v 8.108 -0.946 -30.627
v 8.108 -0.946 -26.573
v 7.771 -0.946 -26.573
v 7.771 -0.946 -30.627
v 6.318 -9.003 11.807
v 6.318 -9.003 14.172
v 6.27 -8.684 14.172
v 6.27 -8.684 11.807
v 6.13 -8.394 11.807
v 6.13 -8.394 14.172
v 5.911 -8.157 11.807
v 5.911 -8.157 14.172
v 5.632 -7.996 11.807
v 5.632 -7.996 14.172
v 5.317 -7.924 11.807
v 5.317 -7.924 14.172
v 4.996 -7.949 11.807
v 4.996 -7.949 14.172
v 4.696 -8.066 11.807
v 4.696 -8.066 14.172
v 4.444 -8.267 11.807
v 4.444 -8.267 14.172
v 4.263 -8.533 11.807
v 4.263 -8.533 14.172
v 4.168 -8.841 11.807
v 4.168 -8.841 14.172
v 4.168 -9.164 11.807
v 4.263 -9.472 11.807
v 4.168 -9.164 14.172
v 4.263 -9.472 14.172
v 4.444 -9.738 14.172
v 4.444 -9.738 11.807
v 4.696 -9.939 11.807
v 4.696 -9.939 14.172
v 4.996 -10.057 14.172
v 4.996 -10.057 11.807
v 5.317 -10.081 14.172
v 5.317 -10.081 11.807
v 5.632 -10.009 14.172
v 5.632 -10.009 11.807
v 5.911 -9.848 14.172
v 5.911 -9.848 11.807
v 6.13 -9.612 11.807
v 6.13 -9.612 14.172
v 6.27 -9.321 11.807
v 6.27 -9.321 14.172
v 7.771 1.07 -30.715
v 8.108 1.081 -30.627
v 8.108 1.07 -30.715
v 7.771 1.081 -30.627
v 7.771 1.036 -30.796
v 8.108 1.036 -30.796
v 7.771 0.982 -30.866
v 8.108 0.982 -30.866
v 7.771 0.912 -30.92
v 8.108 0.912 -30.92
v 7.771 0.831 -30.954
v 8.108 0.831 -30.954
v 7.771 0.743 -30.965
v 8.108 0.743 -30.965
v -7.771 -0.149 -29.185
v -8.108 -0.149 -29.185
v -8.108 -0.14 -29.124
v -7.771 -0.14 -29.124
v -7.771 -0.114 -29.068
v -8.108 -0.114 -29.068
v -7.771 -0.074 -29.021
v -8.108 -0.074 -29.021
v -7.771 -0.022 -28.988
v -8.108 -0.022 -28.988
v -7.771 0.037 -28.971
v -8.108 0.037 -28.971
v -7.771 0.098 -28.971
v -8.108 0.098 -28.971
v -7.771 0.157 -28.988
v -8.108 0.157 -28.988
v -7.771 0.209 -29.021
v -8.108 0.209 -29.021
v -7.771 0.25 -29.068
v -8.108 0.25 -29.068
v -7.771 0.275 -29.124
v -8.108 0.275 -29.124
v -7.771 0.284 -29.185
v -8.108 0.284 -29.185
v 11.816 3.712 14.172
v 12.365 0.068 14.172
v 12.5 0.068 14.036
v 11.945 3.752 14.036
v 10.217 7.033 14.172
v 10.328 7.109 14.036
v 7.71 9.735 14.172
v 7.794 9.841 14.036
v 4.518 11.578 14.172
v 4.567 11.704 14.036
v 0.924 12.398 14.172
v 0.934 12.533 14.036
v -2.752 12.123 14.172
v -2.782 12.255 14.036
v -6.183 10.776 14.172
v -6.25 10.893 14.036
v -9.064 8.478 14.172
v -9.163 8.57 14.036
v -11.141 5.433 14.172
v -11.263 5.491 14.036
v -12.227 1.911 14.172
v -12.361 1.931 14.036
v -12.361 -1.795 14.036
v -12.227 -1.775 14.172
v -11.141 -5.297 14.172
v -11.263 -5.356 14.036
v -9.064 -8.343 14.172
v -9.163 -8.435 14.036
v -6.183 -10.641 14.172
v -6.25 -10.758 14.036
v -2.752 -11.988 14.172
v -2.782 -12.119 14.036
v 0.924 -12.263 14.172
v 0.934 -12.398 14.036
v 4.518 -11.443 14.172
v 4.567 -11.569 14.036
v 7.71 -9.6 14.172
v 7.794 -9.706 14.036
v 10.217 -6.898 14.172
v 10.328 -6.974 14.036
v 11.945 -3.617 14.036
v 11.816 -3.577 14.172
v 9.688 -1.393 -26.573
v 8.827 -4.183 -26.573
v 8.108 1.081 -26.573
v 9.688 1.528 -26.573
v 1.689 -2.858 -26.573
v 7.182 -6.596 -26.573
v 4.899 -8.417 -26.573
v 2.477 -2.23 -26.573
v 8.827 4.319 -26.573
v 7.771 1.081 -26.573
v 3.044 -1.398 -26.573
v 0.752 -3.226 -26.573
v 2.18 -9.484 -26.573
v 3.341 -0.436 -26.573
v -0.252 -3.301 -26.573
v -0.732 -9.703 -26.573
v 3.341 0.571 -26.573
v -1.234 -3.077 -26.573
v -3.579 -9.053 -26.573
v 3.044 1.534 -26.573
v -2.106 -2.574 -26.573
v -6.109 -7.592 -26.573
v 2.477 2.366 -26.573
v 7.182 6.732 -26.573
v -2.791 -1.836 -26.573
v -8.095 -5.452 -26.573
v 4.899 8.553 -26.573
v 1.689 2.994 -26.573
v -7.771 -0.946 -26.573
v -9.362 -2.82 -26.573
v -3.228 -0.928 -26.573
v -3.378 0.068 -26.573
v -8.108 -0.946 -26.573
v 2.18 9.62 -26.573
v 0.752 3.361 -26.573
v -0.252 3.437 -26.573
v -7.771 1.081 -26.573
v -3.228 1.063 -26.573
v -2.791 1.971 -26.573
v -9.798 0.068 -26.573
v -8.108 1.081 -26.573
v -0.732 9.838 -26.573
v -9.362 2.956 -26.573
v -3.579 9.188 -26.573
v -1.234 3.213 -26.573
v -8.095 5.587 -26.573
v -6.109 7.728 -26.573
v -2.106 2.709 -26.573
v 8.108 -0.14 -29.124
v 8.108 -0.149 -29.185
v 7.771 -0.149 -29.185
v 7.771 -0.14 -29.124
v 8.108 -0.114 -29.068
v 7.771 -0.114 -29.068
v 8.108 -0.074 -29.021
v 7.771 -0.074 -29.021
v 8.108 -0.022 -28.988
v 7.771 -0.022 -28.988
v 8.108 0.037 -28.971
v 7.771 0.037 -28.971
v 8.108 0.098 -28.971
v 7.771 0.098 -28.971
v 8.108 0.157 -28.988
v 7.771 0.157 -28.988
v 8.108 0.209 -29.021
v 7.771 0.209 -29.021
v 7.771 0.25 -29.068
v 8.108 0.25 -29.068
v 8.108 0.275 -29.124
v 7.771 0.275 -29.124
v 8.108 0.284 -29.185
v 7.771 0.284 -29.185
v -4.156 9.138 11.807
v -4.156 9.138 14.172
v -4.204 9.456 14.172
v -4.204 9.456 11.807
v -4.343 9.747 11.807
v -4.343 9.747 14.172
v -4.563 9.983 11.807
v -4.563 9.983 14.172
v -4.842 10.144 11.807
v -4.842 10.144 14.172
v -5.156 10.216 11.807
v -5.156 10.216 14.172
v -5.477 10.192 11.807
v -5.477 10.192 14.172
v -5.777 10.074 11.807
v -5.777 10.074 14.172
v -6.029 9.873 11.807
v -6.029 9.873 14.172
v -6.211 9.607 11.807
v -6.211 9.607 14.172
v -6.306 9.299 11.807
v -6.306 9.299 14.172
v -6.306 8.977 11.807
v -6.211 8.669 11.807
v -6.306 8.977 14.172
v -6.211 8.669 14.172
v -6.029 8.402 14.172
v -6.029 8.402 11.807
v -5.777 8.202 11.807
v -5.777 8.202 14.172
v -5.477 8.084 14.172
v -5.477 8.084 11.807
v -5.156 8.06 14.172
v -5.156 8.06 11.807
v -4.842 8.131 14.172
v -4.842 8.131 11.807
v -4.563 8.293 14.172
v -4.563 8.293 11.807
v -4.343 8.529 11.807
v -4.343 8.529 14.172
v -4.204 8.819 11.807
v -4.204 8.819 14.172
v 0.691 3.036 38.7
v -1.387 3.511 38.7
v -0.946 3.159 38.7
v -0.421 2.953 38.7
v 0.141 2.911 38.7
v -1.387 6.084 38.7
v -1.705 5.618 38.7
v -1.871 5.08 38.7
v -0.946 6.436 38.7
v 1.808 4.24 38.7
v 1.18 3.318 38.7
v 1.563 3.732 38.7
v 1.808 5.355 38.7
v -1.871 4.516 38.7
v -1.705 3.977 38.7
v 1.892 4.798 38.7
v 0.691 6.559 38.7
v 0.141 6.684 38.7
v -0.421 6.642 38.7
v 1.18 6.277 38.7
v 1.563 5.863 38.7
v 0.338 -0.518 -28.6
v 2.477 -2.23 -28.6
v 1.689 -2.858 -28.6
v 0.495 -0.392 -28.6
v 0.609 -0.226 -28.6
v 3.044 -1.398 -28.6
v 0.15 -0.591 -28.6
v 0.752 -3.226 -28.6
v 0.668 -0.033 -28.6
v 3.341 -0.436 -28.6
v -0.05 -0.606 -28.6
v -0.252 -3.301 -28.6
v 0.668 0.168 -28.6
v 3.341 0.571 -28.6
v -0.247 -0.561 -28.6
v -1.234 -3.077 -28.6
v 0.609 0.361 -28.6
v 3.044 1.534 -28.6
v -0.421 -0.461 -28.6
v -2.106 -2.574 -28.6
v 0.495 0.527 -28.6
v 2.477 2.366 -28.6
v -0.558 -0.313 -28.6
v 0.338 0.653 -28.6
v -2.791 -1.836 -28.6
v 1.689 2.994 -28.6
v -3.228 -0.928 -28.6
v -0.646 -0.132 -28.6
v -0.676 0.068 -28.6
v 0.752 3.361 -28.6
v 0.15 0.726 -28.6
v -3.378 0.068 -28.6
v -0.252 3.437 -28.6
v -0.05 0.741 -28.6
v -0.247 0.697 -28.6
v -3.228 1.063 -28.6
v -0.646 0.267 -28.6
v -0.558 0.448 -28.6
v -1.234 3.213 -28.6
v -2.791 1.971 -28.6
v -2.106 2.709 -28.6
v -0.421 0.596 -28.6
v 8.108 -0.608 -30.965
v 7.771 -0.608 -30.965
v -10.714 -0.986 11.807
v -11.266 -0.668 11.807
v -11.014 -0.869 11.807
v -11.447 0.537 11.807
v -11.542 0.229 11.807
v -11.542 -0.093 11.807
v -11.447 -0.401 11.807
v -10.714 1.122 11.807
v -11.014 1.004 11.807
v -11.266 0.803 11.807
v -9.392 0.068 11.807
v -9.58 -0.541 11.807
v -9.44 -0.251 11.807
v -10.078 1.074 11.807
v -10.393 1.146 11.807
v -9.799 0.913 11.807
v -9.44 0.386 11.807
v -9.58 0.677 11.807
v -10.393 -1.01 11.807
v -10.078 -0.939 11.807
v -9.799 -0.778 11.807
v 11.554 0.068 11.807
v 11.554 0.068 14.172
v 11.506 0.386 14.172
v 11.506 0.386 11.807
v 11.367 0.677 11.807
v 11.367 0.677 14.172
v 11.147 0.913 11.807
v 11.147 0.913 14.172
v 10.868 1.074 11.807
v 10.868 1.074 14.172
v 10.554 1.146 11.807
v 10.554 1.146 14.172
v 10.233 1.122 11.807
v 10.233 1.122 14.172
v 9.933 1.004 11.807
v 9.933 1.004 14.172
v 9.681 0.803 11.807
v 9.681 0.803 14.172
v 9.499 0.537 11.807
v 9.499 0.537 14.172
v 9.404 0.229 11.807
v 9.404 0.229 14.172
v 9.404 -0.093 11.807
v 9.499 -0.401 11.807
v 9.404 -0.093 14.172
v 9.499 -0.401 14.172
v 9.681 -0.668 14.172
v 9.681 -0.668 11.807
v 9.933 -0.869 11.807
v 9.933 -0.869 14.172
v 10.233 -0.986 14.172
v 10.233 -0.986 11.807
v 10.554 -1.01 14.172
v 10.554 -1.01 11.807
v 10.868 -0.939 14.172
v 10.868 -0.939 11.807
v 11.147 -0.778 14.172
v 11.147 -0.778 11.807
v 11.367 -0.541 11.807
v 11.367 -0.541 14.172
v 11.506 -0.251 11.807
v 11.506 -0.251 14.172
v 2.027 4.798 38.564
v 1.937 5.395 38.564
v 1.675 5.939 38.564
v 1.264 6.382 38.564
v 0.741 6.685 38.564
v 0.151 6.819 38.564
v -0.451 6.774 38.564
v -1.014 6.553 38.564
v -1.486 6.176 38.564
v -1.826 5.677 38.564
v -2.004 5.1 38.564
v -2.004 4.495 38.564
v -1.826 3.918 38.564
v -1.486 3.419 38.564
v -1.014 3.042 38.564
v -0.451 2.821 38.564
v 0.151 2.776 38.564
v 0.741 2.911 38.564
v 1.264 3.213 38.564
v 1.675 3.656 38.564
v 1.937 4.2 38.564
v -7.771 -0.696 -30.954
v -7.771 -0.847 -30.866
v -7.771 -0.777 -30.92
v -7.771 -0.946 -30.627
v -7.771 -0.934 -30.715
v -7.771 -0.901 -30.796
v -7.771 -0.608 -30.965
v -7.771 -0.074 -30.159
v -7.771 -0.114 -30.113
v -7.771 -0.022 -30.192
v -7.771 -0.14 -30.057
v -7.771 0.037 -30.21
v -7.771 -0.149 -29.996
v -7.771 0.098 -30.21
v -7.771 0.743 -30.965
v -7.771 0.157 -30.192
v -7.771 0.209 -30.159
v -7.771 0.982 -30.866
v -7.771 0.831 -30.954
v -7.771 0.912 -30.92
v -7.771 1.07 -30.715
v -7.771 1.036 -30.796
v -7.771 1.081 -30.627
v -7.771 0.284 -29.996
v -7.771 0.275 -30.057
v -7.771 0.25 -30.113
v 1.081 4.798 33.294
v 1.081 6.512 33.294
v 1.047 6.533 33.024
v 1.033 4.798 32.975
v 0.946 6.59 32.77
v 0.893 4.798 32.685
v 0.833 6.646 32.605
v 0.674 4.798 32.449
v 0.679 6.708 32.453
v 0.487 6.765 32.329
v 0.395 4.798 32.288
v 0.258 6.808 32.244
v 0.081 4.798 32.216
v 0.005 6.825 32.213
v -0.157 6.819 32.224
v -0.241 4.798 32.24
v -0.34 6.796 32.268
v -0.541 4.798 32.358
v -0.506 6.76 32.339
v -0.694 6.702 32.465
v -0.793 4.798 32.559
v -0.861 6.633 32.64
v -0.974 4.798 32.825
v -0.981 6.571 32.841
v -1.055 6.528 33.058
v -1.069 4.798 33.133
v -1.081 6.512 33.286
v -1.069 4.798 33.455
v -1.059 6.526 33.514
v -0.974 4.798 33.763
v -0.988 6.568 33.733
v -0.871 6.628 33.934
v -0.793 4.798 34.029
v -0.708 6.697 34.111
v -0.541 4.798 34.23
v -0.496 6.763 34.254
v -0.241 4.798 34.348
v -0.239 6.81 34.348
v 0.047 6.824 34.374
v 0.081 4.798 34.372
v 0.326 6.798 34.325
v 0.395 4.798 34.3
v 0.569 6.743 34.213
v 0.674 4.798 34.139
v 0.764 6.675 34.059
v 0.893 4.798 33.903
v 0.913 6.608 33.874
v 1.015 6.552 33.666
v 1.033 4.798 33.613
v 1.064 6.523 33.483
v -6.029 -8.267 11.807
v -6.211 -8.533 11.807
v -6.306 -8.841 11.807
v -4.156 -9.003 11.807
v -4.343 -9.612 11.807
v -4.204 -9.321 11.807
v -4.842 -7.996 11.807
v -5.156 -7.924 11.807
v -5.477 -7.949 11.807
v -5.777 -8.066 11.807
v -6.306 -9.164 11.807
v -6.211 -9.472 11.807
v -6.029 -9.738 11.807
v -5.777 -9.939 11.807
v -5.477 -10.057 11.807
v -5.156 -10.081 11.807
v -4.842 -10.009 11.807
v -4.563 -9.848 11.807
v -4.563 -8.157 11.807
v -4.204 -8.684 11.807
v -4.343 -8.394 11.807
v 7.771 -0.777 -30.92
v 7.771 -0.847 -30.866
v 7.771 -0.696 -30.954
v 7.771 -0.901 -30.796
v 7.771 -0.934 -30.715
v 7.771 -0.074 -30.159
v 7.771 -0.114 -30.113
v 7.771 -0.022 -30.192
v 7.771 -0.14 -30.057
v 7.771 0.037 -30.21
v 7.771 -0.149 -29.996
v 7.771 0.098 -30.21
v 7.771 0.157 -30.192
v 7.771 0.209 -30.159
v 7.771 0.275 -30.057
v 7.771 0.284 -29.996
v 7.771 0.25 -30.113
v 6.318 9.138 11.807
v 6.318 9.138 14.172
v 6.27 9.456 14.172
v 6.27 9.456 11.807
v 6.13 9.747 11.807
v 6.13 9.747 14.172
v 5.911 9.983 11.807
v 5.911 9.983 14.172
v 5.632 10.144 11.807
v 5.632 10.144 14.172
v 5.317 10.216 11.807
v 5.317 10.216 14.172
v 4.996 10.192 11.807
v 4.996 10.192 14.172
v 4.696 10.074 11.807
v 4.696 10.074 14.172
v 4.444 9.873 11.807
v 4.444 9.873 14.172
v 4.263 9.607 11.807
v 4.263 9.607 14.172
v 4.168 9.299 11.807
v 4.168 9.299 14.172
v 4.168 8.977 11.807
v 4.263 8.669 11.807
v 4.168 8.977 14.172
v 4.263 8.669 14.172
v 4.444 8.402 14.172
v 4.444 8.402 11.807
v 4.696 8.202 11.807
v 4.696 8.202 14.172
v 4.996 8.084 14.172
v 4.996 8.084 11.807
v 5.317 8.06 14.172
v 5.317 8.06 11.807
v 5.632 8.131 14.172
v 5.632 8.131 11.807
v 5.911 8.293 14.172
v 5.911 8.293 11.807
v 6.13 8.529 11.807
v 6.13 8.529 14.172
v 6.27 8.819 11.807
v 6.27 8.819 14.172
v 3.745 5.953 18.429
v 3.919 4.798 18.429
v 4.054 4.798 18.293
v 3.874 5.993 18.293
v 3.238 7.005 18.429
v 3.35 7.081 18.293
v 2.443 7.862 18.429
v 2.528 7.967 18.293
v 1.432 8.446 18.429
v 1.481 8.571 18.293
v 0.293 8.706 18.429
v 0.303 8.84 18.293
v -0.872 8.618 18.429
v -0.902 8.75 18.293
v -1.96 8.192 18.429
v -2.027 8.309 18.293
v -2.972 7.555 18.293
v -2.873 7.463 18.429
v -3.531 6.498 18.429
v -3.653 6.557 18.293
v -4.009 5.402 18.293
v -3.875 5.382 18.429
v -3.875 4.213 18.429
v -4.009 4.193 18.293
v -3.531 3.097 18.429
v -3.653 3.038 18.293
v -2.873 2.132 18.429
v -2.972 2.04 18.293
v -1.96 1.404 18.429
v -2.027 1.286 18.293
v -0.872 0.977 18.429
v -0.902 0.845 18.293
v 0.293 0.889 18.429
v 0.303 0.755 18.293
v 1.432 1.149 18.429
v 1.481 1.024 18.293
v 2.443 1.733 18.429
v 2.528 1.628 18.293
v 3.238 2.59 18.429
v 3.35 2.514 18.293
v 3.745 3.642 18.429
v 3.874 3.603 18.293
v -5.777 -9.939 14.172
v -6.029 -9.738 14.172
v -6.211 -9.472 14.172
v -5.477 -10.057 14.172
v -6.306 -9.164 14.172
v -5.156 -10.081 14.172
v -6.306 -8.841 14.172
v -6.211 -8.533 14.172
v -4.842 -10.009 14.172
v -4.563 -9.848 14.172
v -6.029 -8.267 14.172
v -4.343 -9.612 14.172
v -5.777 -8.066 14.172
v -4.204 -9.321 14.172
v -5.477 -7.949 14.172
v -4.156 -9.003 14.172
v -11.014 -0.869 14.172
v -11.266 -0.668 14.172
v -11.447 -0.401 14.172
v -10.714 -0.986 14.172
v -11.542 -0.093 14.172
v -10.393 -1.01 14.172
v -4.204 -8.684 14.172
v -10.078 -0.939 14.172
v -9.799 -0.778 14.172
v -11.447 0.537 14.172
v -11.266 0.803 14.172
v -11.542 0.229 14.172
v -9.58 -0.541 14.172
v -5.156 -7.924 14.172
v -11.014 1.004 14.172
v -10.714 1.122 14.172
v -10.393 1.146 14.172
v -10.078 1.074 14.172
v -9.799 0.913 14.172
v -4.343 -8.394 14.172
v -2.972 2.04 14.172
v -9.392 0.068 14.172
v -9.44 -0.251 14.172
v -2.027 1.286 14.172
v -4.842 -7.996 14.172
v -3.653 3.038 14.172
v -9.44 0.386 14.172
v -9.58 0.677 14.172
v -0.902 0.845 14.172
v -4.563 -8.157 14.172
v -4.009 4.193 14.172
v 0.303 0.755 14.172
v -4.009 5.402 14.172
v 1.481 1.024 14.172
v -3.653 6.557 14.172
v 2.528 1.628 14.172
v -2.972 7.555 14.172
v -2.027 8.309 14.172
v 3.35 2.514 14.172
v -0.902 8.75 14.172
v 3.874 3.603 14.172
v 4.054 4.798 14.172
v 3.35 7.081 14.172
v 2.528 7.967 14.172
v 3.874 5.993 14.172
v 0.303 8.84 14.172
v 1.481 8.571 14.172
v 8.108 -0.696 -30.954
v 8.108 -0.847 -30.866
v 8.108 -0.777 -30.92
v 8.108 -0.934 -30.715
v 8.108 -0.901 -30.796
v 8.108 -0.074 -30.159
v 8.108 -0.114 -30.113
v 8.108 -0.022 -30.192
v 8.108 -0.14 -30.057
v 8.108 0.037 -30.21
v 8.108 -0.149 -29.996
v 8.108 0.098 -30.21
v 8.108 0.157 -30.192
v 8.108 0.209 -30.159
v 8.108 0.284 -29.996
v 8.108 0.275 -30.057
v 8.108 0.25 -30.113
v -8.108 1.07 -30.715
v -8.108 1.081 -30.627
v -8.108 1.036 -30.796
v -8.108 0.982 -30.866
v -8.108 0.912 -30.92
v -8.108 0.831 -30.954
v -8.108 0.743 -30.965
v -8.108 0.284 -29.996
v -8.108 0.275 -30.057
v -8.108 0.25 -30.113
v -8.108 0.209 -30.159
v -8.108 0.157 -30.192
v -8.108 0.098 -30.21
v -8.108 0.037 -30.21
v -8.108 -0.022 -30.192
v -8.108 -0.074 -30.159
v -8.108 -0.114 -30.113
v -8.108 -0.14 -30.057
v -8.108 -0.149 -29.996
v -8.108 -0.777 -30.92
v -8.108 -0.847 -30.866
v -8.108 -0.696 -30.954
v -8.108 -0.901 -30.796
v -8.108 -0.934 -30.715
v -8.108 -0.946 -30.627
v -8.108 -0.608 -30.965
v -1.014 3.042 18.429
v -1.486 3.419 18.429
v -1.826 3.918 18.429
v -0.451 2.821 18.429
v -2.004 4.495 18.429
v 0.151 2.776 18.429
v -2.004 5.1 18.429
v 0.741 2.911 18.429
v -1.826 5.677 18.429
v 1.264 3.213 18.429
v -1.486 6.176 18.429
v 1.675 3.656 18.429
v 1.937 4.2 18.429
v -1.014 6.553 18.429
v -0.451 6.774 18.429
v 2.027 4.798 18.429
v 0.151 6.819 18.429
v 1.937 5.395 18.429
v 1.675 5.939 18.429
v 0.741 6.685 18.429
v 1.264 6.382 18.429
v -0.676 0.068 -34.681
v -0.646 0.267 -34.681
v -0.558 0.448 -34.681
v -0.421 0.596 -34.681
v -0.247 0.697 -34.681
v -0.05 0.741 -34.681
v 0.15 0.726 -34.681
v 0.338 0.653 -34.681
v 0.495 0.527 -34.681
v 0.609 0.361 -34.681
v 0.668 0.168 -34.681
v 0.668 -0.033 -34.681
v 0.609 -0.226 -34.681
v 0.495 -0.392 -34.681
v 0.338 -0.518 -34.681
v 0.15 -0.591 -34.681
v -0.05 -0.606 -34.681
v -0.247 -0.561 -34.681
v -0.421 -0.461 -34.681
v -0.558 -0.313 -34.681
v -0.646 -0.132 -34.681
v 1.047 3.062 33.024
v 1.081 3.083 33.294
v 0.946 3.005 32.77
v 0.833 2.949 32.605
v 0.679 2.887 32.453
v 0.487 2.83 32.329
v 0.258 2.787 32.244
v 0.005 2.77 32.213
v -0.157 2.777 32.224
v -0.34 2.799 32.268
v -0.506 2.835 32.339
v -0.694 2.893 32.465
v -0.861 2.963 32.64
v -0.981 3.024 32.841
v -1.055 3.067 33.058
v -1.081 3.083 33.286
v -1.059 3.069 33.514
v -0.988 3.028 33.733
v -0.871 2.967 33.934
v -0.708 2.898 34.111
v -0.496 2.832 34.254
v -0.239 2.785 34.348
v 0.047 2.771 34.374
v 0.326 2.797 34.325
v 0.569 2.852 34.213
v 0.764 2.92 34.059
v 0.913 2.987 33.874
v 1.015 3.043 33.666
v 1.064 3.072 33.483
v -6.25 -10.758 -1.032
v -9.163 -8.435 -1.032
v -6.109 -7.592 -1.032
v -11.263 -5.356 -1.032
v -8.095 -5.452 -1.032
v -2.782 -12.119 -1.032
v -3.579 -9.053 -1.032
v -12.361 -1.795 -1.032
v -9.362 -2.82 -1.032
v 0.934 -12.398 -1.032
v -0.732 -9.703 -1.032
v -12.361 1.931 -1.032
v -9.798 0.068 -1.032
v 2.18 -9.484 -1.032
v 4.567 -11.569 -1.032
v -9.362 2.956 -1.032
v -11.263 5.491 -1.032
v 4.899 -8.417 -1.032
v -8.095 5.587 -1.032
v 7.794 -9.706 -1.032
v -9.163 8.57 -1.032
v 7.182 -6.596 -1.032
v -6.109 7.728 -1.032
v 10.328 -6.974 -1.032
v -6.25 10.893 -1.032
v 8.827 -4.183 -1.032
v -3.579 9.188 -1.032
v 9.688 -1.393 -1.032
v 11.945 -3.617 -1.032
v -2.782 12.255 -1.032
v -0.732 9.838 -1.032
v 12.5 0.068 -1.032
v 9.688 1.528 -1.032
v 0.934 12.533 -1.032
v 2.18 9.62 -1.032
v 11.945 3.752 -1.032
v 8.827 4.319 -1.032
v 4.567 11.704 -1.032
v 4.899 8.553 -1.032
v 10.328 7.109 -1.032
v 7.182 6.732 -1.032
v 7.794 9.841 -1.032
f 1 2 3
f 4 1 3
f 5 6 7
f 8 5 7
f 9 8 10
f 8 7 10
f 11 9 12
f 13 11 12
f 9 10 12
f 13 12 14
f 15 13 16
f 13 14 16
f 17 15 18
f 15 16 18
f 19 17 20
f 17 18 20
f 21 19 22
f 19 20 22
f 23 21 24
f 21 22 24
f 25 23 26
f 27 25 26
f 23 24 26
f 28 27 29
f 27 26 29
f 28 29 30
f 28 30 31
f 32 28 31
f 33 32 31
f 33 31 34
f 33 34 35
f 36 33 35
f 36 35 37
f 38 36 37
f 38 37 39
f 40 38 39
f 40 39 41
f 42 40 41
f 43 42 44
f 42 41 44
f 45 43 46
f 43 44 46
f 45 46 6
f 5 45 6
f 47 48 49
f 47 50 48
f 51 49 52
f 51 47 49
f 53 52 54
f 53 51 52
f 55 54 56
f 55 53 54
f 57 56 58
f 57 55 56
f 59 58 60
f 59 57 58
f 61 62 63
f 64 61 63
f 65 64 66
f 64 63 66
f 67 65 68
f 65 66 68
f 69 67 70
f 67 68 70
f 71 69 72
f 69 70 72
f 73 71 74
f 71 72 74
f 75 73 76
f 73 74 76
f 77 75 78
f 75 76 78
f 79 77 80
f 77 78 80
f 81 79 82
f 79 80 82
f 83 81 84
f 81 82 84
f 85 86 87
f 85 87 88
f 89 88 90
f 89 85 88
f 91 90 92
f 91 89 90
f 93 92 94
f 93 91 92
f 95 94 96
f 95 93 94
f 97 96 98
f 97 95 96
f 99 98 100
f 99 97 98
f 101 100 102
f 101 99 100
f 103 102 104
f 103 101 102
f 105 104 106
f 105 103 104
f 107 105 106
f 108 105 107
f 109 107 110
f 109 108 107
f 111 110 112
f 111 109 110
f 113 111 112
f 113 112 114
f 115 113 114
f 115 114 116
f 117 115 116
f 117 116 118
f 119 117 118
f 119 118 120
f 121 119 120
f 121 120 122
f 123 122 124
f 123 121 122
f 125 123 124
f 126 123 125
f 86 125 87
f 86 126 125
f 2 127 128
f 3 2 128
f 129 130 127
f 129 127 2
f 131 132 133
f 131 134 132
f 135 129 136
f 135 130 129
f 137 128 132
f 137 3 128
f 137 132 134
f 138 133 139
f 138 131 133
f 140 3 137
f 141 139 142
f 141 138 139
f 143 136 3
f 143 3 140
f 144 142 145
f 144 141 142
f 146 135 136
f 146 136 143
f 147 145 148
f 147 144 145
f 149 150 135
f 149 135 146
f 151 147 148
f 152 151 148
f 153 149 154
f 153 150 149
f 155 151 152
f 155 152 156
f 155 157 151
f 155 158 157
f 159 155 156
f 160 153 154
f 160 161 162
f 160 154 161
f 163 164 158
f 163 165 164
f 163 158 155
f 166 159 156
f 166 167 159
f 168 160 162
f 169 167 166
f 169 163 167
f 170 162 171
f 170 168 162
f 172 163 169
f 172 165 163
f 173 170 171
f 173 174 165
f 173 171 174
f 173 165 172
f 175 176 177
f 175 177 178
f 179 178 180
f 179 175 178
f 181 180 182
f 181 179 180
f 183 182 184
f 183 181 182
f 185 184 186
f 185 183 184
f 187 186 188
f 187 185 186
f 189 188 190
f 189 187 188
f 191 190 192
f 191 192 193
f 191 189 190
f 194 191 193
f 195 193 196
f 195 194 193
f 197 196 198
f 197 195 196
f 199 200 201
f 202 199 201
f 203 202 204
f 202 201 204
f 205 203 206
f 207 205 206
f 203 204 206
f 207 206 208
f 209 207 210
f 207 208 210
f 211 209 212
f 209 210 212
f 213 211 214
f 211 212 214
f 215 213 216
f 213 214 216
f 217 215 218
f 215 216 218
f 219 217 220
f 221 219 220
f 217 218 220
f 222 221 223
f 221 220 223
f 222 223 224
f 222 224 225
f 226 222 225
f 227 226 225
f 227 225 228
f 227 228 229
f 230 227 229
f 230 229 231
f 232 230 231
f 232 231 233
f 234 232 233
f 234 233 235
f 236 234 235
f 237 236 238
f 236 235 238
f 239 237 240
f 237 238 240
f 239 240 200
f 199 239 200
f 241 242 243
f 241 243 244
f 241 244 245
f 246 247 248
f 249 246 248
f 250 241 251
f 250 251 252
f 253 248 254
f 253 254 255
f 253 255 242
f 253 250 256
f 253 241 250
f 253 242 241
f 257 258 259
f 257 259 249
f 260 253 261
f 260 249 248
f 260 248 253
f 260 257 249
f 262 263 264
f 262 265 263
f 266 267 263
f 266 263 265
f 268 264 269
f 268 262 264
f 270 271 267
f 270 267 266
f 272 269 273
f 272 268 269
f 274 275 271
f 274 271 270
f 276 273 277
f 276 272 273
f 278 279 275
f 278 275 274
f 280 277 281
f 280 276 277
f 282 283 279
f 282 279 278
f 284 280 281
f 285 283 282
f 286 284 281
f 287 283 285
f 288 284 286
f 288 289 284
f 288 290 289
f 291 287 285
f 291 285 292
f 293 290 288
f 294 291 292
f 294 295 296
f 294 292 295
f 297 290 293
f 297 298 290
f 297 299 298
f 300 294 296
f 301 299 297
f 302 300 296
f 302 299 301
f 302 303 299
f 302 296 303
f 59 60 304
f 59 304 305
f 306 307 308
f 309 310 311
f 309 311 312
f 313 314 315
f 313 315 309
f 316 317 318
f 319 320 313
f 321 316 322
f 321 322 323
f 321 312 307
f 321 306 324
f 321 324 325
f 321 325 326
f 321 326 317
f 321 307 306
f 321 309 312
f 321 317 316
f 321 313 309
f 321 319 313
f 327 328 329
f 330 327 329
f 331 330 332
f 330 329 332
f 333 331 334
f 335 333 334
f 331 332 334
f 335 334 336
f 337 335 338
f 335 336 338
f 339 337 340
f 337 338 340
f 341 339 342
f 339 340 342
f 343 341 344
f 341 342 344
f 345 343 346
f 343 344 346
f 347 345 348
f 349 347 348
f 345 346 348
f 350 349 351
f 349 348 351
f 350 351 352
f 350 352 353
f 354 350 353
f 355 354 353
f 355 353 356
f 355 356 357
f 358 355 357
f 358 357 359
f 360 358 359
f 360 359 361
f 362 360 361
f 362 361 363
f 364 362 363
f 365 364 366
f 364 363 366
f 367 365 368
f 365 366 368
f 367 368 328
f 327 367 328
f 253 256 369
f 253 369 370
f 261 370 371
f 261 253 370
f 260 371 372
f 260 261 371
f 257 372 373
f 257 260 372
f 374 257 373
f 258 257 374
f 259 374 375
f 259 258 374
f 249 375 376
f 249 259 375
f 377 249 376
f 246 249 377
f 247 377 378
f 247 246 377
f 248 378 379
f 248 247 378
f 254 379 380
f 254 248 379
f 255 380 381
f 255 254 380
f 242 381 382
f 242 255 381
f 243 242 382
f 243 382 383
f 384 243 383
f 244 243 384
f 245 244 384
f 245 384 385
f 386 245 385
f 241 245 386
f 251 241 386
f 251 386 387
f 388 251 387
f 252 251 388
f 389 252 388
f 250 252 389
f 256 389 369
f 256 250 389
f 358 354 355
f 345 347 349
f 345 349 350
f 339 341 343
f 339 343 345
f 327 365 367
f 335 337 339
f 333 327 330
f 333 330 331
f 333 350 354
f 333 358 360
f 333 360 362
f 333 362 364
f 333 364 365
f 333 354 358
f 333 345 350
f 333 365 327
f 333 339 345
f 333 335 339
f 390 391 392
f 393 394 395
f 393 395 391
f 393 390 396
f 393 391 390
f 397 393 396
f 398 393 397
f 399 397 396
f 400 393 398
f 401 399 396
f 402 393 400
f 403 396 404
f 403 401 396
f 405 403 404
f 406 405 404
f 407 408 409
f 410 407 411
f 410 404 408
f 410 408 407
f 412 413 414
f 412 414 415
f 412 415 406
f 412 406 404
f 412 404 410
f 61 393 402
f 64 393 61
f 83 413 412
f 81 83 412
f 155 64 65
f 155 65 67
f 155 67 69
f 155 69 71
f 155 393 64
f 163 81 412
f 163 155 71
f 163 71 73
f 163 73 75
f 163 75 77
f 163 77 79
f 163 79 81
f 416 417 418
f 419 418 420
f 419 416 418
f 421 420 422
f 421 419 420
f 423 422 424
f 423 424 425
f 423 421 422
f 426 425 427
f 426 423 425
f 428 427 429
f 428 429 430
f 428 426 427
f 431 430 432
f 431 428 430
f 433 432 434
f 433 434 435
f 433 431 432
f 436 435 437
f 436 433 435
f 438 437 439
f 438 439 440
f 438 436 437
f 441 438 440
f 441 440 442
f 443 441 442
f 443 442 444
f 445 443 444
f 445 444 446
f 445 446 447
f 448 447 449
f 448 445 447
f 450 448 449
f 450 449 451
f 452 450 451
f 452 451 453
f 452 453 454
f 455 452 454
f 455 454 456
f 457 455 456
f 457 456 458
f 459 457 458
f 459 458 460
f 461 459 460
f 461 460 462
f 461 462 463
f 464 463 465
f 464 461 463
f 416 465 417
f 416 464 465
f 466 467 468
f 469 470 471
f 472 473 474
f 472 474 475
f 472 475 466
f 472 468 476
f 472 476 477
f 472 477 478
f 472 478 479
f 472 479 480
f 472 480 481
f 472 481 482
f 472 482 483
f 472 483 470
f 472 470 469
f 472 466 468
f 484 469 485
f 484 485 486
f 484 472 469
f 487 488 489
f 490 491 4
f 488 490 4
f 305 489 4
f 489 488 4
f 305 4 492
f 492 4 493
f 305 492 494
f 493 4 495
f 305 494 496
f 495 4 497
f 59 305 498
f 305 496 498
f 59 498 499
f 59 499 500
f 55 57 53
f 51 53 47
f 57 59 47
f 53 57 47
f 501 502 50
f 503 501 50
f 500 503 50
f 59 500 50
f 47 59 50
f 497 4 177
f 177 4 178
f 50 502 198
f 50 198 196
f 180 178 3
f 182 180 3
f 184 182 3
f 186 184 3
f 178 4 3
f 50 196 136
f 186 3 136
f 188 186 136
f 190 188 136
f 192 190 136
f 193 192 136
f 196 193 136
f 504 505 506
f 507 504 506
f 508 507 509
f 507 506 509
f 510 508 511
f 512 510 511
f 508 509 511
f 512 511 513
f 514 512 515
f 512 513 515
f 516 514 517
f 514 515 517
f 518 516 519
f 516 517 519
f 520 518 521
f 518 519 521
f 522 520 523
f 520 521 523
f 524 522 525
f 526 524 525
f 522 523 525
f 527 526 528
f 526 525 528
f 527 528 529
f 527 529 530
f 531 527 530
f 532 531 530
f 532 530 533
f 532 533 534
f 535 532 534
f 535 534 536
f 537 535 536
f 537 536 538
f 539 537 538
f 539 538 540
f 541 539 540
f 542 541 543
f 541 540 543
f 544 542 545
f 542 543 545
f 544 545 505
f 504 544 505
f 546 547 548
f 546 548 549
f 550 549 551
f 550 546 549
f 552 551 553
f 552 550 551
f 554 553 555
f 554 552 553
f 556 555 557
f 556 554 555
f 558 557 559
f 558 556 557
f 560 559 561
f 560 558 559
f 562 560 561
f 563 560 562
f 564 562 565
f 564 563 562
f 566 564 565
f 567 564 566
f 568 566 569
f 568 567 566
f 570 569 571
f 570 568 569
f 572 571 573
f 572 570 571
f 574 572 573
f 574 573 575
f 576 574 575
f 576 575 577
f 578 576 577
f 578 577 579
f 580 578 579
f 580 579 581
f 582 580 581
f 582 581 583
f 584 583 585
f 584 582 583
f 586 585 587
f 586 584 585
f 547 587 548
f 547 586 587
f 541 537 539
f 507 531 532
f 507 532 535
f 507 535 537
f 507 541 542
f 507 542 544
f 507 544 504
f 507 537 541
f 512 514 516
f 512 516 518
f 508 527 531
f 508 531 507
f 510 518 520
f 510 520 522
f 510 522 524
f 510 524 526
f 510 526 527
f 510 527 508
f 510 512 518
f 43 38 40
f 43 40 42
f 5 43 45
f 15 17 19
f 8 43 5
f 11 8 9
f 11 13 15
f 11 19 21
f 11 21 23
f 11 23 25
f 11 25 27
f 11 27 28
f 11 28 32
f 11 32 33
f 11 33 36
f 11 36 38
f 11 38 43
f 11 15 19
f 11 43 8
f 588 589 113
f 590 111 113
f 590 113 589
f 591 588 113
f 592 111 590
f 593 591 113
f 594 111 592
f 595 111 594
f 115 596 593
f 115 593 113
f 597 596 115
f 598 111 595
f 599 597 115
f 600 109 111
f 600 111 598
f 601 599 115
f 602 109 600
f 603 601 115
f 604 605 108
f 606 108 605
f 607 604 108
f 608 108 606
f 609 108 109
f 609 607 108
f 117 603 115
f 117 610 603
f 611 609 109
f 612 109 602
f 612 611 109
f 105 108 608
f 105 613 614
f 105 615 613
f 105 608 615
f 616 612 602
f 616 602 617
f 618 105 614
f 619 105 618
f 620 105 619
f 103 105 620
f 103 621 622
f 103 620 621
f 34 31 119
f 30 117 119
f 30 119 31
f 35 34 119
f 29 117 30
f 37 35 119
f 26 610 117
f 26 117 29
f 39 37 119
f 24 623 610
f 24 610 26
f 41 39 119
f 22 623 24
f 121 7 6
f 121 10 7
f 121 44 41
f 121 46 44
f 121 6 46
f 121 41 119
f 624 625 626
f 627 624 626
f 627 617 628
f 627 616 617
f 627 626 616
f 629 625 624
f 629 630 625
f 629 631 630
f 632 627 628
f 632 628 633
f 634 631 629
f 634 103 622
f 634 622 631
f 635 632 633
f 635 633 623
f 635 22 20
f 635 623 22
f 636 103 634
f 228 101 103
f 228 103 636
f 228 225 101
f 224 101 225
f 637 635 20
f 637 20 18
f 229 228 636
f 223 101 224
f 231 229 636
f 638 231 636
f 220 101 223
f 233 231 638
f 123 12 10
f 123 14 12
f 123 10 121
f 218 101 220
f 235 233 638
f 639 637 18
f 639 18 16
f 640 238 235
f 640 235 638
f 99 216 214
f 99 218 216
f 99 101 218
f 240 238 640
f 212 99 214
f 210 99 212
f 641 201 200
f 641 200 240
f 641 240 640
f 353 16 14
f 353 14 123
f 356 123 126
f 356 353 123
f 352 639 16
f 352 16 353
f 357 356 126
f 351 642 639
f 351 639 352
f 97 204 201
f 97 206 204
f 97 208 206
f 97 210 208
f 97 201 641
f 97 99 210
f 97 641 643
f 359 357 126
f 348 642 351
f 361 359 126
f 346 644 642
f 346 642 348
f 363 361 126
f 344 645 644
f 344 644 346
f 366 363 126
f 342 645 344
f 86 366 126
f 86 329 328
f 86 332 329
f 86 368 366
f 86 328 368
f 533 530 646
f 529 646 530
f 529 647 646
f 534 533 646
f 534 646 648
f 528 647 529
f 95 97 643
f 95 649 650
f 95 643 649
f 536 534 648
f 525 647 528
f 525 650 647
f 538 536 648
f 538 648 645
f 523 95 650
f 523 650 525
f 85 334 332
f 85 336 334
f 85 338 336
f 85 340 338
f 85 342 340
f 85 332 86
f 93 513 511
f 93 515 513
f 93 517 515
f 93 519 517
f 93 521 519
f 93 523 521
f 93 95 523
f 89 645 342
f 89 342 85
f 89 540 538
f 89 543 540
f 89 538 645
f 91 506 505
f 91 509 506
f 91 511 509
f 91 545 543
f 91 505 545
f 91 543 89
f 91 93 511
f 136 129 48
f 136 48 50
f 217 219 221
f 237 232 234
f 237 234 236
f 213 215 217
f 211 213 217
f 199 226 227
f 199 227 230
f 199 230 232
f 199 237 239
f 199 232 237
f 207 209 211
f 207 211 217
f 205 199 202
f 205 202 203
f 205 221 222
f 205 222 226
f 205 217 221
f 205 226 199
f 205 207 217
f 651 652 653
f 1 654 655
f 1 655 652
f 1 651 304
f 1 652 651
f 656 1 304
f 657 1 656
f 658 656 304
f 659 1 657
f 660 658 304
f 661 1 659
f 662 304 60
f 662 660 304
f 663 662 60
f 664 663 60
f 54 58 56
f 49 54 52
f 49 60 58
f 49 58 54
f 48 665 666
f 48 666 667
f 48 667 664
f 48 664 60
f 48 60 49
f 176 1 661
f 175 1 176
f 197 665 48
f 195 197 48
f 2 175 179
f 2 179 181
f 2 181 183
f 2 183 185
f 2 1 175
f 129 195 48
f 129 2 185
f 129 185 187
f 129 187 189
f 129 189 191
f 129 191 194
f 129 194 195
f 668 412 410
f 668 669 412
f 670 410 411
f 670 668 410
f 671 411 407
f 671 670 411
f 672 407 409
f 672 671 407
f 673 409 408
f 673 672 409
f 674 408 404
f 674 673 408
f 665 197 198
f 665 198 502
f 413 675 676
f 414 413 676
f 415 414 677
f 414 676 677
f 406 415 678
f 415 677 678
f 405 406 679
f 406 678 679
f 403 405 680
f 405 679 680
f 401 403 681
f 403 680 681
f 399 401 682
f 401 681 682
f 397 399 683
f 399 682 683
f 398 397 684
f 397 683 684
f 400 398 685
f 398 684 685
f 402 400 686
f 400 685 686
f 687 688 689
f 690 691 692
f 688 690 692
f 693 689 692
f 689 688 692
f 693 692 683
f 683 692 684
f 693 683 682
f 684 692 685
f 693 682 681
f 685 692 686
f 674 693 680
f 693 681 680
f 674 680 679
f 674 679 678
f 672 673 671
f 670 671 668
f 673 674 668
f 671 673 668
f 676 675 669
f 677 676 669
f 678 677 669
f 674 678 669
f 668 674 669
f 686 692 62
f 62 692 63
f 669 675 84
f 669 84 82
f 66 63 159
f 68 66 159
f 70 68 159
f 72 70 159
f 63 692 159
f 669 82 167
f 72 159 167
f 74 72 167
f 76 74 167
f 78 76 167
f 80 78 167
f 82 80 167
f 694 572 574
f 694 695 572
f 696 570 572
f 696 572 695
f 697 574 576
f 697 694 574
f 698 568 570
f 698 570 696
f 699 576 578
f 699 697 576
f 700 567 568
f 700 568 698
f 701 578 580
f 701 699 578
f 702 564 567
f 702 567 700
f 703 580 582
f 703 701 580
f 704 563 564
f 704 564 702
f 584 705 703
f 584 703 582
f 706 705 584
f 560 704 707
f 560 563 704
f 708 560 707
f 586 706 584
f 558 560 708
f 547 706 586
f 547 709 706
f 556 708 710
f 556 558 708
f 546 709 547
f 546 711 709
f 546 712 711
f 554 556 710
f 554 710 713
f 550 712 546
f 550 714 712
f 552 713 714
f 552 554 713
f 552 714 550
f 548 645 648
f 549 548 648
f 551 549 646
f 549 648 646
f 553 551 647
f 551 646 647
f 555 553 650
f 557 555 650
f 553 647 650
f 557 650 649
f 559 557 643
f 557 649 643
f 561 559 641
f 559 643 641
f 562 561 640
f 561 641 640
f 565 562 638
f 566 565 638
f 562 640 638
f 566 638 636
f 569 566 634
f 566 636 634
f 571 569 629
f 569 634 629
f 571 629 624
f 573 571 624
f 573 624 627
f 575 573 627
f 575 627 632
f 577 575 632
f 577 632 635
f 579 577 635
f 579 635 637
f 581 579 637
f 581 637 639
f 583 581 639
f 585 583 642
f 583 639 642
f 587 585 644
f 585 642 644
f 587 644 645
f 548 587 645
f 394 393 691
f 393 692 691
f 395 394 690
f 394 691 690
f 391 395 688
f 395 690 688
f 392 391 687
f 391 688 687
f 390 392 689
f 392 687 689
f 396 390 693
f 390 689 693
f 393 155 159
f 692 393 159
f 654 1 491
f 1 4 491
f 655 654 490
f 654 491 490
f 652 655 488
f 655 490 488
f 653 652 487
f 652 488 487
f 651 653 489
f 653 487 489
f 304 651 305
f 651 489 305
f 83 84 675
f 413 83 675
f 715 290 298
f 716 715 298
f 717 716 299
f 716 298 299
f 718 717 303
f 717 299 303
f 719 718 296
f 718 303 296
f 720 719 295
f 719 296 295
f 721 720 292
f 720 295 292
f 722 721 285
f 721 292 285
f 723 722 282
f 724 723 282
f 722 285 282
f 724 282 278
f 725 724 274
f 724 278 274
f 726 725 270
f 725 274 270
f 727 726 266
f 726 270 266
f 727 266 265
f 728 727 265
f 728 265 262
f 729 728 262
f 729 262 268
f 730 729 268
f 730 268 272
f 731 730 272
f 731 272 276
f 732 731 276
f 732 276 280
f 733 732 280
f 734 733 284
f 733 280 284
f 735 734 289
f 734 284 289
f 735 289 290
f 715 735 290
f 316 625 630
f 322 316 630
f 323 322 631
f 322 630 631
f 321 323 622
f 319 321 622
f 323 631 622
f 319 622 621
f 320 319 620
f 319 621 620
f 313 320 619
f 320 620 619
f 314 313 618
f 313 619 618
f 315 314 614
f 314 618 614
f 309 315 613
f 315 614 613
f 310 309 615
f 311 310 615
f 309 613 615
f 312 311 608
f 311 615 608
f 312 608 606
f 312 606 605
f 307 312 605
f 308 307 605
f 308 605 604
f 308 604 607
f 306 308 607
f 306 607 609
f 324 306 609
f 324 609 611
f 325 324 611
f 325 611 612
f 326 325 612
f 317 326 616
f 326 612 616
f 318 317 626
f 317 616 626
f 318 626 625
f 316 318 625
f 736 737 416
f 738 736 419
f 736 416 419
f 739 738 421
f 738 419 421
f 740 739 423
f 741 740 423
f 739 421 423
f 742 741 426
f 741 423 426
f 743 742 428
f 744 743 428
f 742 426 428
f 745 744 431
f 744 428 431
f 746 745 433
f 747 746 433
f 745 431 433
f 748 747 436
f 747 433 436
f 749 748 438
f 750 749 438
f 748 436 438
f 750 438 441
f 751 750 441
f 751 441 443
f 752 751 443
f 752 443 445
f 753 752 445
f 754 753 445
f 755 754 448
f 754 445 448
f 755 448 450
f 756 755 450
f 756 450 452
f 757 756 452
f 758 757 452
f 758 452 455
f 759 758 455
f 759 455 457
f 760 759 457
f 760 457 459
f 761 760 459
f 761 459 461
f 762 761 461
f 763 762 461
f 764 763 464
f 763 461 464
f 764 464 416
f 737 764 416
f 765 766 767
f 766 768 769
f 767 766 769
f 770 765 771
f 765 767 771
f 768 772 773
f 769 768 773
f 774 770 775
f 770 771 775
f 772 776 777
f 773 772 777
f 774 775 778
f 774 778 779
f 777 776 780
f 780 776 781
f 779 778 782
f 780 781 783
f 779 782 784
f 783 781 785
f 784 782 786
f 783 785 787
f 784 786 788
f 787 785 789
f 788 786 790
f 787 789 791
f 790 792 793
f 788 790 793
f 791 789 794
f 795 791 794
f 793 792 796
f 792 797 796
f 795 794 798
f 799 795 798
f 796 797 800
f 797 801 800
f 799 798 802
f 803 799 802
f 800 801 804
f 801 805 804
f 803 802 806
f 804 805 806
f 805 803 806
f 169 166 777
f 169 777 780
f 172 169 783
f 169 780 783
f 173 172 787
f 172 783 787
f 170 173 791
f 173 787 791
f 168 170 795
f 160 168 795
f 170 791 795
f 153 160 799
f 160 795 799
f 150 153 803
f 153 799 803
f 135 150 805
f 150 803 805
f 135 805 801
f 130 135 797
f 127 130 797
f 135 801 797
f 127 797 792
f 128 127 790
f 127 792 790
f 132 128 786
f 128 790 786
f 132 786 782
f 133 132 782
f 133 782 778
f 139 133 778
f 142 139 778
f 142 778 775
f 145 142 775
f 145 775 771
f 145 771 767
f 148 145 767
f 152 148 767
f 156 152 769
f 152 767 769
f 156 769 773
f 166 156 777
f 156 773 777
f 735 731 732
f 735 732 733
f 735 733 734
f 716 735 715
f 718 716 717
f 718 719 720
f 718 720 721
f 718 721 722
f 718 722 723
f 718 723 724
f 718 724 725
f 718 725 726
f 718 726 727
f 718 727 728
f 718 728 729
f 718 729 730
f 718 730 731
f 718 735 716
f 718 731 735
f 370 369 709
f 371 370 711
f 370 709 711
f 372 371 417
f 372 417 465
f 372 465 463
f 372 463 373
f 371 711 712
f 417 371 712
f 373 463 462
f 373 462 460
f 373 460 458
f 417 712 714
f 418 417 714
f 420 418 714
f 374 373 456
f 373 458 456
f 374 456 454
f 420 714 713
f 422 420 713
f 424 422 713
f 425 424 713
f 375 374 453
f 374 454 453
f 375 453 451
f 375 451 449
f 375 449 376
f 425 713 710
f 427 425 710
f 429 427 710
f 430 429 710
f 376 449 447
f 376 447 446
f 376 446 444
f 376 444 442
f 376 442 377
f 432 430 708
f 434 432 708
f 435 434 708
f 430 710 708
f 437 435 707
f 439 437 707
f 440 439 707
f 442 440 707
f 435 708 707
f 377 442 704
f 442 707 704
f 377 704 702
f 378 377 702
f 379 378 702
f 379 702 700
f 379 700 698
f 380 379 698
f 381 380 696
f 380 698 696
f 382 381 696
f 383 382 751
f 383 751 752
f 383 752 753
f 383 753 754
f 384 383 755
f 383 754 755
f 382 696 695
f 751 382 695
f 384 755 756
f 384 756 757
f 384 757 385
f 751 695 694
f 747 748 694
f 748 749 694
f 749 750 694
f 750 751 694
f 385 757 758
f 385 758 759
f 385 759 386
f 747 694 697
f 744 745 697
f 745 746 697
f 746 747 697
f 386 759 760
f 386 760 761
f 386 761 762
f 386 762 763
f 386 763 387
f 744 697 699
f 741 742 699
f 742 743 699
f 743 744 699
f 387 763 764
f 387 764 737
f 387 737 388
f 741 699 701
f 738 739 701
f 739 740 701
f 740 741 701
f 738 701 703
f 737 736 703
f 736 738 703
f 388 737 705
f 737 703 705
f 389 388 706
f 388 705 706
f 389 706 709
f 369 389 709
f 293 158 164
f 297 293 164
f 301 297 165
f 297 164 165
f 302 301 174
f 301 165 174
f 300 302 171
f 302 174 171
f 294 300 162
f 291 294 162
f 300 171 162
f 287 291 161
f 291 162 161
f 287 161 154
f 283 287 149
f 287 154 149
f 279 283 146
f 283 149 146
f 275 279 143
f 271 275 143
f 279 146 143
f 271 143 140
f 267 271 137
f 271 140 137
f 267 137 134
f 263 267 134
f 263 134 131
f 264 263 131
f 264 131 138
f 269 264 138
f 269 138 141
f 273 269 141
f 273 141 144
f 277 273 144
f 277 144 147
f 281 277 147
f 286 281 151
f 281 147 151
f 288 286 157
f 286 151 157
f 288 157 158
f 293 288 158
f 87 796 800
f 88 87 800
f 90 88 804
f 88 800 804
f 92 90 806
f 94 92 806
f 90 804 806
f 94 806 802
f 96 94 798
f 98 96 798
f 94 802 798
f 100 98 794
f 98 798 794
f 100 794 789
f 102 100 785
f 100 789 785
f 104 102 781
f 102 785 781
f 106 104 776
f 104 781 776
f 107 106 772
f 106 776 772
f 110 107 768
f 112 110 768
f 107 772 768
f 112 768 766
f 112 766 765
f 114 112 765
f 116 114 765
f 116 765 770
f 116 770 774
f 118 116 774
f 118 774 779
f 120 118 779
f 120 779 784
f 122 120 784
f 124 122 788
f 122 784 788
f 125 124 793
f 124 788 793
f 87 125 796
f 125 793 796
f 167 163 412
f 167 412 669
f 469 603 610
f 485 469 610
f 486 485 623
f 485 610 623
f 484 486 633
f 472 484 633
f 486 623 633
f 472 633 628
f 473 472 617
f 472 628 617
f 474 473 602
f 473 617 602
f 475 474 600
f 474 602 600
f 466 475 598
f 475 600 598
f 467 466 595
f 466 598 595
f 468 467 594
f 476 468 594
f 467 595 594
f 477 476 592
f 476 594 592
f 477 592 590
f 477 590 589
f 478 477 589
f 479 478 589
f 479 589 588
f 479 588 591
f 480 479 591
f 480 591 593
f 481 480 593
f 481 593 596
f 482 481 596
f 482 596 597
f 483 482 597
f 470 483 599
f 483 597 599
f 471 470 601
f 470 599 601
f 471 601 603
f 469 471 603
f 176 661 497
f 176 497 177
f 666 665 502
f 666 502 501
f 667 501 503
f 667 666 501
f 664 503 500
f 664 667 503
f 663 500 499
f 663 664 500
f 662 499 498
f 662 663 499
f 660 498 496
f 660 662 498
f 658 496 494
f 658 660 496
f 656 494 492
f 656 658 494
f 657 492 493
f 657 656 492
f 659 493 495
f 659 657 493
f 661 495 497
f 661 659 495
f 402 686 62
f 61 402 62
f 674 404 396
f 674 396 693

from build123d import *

# Parameters (mm, degrees)
SKETCH1_R               = 18.5
BOSS_EXTRUDE1_DEPTH     = 22.5
SKETCH2_R               = 1.6
CUT_EXTRUDE1_DEPTH      = 3.5
SKETCH3_R               = 3
BOSS_EXTRUDE2_DEPTH     = 36.3
SKETCH3_3_R             = 6
SKETCH3_3_R_2           = 3
BOSS_EXTRUDE3_DEPTH     = 6.3
SKETCH4_R               = 14.5
BOSS_EXTRUDE4_DEPTH     = 37.8
SKETCH5_R               = 5
BOSS_EXTRUDE5_DEPTH     = 3
SKETCH6_R               = 1
BOSS_EXTRUDE6_DEPTH     = 9
SKETCH7_W               = 0.5
SKETCH7_H               = 3
BOSS_EXTRUDE7_DEPTH     = 6.5
CUT_EXTRUDE2_DEPTH      = 0.5
FILLET1_R               = 0.5
CHAMFER1_SIZE           = 0.2
SKETCH9_R               = 1.6
CUT_EXTRUDE3_DEPTH      = 12.5
CUT_EXTRUDE3_DEPTH_BACK = 26.5
SCALE1_SCALE            = 0.6757


with BuildPart() as part:
    # Sketch1 → Boss-Extrude1 (new body)
    with BuildSketch(Plane.XY):
        Circle(SKETCH1_R)
    extrude(amount=BOSS_EXTRUDE1_DEPTH)

    # Sketch2 → Cut-Extrude1 (cut)
    with BuildSketch(Plane.XY.offset(22.5)):
        with Locations((-7.75, 13.423393759)):
            Circle(SKETCH2_R)
        with Locations((7.75, 13.423393759)):
            Circle(SKETCH2_R)
        with Locations((-15.5, 0)):
            Circle(SKETCH2_R)
        with Locations((-7.75, -13.423393759)):
            Circle(SKETCH2_R)
        with Locations((7.75, -13.423393759)):
            Circle(SKETCH2_R)
        with Locations((15.5, 0)):
            Circle(SKETCH2_R)
    extrude(amount=-CUT_EXTRUDE1_DEPTH, mode=Mode.SUBTRACT)

    # Sketch3 → Boss-Extrude2 (add)
    with BuildSketch(Plane.XY.offset(22.5)):
        with Locations((0, 7)):
            Circle(SKETCH3_R)
    extrude(amount=BOSS_EXTRUDE2_DEPTH)

    # Sketch3<3> → Boss-Extrude3 (add)
    with BuildSketch(Plane.XY.offset(22.5)):
        with Locations((0, 7)):
            Circle(SKETCH3_3_R)
        with Locations((0, 7)):
            Circle(SKETCH3_3_R_2, mode=Mode.SUBTRACT)
    extrude(amount=BOSS_EXTRUDE3_DEPTH)

    # Sketch4 → Boss-Extrude4 (add)
    with BuildSketch(Plane(origin=(0, 0, 0), x_dir=(-1, 0, 0), z_dir=(0, 0, -1))):
        Circle(SKETCH4_R)
    extrude(amount=BOSS_EXTRUDE4_DEPTH)

    # Sketch5 → Boss-Extrude5 (add)
    with BuildSketch(Plane(origin=(0, 0, -37.8), x_dir=(-1, 0, 0), z_dir=(0, 0, -1))):
        Circle(SKETCH5_R)
    extrude(amount=BOSS_EXTRUDE5_DEPTH)

    # Sketch6 → Boss-Extrude6 (add)
    with BuildSketch(Plane(origin=(0, 0, -40.8), x_dir=(-1, 0, 0), z_dir=(0, 0, -1))):
        Circle(SKETCH6_R)
    extrude(amount=BOSS_EXTRUDE6_DEPTH)

    # Sketch7 → Boss-Extrude7 (add)
    with BuildSketch(Plane(origin=(0, 0, -37.8), x_dir=(-1, 0, 0), z_dir=(0, 0, -1))):
        with Locations((-11.75, 0)):
            Rectangle(SKETCH7_W, SKETCH7_H)
        with Locations((11.75, 0)):
            Rectangle(SKETCH7_W, SKETCH7_H)
    extrude(amount=BOSS_EXTRUDE7_DEPTH)

    # Sketch8 → Cut-Extrude2 (cut)
    with BuildSketch(Plane(origin=(12, 0, 0), x_dir=(0, 0, -1), z_dir=(1, 0, 0))):
        with BuildLine():
            Line((42.865122037, -0.320114275), (41.665122037, -0.320114275))
            ThreePointArc((41.665122037, -0.320114275), (41.345007763, 0), (41.665122037, 0.320114275))
            Line((41.665122037, 0.320114275), (42.865122037, 0.320114275))
            ThreePointArc((42.865122037, 0.320114275), (43.185236312, 0), (42.865122037, -0.320114275))
        make_face()
    cut_extrude2 = extrude(amount=-CUT_EXTRUDE2_DEPTH, mode=Mode.SUBTRACT)

    # Mirror2: Cut-Extrude2 across plane
    add(cut_extrude2.mirror(Plane(origin=(0, 0, 0), x_dir=(0, 0, 1), z_dir=(1, 0, 0))), mode=Mode.SUBTRACT)

    # Fillet1
    fillet1_edges = [part.edges().sort_by_distance(p)[0] for p in [
        (11.75, -1.5, -44.3),
        (11.75, 1.5, -44.3),
        (-11.75, 1.5, -44.3),
        (-11.75, -1.5, -44.3),
    ]]
    fillet(fillet1_edges, radius=FILLET1_R)

    # Chamfer1
    chamfer1_edges = [part.edges().sort_by_distance(p)[0] for p in [
        (-3, 7, 58.8),
        (-6, 7, 28.8),
        (-18.5, 0, 22.5),
    ]]
    chamfer(chamfer1_edges, length=CHAMFER1_SIZE)

    # Sketch9 → Cut-Extrude3 (cut, two sides)
    with BuildSketch(Plane(origin=(0, 7, 0), x_dir=(1, 0, 0), z_dir=(0, 1, 0))) as cut_extrude3_sk:
        with Locations((0, -50.8)):
            Circle(SKETCH9_R)
    extrude(amount=CUT_EXTRUDE3_DEPTH, mode=Mode.SUBTRACT)
    extrude(cut_extrude3_sk.sketch, amount=-CUT_EXTRUDE3_DEPTH_BACK, mode=Mode.SUBTRACT)


with BuildPart() as part_1:
    # Scale1: scaled about (3.1e-08, 0.208571854, -3.181081733)
    add(part.part.scale(SCALE1_SCALE).moved(Location((1e-08, 0.067639852, -1.031624806))))


solid = part_1.part
